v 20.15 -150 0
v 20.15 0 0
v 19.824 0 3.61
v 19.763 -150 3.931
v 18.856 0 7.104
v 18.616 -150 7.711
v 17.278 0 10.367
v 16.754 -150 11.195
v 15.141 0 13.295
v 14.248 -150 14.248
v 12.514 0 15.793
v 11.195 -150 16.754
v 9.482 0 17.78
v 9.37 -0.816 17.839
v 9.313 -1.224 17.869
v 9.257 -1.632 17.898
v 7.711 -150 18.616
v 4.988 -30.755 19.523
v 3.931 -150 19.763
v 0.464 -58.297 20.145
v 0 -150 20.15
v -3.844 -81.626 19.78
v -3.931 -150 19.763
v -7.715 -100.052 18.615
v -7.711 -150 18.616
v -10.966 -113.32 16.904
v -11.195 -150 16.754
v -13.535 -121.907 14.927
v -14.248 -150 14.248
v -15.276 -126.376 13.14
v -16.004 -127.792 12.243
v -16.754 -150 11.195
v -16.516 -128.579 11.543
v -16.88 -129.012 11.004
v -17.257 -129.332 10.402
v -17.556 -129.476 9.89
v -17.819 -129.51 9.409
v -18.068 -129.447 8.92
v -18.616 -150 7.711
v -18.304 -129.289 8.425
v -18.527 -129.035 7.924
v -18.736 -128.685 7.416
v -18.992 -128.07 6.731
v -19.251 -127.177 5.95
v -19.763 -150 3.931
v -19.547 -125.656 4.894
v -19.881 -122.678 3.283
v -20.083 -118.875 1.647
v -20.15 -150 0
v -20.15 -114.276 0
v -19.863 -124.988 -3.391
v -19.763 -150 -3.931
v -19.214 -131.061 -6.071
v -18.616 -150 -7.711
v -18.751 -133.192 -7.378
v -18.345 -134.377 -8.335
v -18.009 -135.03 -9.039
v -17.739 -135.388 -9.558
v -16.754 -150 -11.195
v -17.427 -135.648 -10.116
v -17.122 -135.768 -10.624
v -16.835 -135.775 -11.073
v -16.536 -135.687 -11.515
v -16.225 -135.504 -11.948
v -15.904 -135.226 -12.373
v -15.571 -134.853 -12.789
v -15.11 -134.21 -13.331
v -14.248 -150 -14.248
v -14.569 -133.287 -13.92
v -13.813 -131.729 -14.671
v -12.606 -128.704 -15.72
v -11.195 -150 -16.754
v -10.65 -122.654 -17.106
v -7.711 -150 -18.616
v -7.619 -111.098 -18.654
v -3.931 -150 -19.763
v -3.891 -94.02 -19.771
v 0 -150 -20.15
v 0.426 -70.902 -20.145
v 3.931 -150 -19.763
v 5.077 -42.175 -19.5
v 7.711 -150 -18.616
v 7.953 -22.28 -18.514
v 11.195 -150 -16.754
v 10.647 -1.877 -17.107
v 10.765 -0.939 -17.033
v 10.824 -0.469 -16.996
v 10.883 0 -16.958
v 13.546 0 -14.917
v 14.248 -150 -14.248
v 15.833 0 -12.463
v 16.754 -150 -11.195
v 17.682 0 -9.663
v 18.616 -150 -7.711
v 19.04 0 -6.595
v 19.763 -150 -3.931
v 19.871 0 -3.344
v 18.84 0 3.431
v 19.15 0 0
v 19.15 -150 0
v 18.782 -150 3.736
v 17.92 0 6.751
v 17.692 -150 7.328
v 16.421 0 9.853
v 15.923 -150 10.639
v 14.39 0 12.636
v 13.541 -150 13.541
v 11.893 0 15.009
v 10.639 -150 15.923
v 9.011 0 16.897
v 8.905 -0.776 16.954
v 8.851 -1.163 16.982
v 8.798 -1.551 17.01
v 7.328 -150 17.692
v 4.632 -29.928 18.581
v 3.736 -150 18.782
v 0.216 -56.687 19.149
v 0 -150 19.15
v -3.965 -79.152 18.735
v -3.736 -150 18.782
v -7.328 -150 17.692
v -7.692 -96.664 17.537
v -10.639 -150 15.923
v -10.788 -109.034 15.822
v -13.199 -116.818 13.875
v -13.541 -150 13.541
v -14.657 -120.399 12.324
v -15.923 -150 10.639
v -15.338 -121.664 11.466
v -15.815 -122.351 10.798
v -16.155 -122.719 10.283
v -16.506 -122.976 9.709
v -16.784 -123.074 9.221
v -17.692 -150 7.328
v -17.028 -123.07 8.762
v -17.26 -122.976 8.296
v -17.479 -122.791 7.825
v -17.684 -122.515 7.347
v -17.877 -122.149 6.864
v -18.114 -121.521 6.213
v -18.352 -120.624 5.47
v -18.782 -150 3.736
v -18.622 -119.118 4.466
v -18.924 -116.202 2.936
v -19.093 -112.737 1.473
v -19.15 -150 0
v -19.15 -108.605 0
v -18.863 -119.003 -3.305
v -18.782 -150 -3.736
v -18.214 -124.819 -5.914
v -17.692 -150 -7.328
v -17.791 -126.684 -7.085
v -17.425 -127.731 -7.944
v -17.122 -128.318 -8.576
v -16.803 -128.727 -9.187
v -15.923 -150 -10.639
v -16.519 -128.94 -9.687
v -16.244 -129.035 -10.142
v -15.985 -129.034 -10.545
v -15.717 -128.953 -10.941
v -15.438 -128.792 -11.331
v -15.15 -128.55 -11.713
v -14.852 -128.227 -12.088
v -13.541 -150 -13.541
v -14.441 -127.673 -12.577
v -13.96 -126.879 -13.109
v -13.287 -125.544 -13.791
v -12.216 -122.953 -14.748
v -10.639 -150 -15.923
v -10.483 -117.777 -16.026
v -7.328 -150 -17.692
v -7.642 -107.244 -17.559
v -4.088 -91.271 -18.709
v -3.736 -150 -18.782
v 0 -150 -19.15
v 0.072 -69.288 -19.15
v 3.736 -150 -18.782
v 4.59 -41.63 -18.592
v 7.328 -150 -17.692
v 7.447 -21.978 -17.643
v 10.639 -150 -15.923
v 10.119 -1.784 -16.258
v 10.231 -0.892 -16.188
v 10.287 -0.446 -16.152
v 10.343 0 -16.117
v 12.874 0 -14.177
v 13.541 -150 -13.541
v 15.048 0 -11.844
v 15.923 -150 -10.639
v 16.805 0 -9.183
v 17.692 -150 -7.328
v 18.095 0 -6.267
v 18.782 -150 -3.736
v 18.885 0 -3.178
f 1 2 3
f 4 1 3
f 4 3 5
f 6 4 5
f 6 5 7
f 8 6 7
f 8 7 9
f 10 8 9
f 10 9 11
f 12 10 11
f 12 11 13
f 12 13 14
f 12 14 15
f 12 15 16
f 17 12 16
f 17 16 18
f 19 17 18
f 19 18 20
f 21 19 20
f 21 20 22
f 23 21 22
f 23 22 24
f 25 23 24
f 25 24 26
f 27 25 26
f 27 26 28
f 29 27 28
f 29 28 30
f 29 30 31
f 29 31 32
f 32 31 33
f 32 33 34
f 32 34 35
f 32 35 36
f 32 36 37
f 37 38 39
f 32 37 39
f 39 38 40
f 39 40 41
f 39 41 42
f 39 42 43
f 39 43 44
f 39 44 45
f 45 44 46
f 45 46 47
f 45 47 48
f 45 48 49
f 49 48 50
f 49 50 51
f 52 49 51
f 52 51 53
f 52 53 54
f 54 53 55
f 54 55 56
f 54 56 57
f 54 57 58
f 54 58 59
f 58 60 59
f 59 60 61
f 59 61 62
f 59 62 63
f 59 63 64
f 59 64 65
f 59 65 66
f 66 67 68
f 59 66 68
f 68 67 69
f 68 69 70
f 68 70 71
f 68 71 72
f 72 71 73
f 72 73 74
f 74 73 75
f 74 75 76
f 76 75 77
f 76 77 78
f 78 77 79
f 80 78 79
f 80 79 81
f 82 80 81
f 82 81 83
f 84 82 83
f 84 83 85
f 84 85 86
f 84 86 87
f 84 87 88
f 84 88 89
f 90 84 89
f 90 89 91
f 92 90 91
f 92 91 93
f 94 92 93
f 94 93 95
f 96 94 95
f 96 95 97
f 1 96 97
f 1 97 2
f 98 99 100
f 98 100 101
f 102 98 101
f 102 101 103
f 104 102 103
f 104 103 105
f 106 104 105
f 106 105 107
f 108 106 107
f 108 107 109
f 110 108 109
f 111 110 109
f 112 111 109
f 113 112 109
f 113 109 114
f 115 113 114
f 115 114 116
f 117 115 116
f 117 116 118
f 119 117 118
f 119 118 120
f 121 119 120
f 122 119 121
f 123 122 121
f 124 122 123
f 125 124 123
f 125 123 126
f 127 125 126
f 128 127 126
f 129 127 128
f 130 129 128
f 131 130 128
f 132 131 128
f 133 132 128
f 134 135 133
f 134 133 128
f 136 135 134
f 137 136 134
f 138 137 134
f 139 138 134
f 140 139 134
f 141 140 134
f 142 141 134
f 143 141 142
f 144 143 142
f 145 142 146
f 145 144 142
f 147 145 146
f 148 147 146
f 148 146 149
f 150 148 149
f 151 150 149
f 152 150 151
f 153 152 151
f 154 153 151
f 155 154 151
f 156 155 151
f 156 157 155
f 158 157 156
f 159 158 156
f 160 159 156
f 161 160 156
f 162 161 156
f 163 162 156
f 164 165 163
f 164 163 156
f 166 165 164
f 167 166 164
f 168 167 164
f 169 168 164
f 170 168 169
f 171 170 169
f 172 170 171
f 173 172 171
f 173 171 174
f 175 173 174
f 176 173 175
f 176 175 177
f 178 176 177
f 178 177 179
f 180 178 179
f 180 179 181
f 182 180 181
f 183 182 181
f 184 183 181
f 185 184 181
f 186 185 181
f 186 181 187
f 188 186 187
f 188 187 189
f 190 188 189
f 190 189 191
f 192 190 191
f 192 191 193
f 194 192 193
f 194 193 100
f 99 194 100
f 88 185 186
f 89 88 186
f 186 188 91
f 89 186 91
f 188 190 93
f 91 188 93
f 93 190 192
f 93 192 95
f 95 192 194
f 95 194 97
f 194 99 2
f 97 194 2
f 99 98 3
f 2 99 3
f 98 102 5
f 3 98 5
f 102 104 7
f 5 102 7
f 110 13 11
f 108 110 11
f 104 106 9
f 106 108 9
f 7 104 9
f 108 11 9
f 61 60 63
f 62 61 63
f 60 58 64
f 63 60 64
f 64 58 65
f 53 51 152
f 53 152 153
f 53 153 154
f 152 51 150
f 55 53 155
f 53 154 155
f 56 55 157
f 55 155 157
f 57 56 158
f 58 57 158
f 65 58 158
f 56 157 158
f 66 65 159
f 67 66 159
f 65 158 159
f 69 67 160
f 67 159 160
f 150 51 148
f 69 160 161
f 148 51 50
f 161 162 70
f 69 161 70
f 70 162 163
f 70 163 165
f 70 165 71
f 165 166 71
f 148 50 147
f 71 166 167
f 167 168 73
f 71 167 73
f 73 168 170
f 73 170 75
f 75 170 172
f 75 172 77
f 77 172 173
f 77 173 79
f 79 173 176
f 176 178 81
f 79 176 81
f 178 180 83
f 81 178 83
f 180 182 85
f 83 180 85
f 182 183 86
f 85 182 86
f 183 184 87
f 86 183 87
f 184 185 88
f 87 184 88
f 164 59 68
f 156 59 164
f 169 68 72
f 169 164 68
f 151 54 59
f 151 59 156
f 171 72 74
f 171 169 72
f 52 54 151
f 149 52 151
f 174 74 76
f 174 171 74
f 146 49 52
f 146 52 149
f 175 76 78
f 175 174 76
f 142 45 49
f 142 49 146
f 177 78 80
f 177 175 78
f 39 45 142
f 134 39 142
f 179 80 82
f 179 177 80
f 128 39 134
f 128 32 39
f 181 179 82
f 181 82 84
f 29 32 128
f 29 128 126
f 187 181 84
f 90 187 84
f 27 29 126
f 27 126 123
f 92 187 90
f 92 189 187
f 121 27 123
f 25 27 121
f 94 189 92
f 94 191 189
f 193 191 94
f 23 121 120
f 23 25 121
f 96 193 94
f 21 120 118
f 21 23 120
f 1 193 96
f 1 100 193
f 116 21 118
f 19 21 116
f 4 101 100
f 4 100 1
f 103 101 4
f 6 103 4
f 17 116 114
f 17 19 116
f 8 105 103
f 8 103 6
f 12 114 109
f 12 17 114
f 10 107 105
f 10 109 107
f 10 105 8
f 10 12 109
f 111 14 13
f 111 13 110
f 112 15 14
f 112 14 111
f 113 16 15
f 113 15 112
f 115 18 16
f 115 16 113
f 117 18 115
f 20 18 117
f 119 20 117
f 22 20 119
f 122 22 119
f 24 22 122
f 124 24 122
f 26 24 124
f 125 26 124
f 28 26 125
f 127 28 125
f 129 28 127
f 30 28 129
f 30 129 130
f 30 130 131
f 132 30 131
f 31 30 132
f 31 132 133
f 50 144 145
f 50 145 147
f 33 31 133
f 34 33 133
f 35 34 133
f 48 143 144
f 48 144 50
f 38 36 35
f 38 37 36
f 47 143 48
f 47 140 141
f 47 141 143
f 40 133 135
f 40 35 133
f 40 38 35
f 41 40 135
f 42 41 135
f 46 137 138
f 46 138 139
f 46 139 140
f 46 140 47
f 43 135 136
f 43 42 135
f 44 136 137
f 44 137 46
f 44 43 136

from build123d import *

# Parameters (mm, degrees)
F0_R     = 20.15
F0_R_2   = 19.15
F1_DEPTH = 150
F4_DEPTH = 151.221174
F5_DEPTH = 3.500011


with BuildPart() as f1:
    # F0 (on Front) → F1 (new body)
    with BuildSketch(Plane.XZ):
        Circle(F0_R)
        Circle(F0_R_2, mode=Mode.SUBTRACT)
    extrude(amount=F1_DEPTH)

    # F3 (on face) → F4 (cut, through all)
    with BuildSketch(Plane(origin=(0, 0, 0), x_dir=(-0.984808, 0.173648, 0), z_dir=(0.173648, 0.984808, 0))):
        with BuildLine():
            Line((0, 0), (-16.027075, -25.360064))
            ThreePointArc((-16.027075, -25.360064), (29.975998, -1.199822), (-13.948922, 26.559887))
            Line((-13.948922, 26.559887), (0, 0))
        make_face()
    extrude(amount=-F4_DEPTH, mode=Mode.SUBTRACT)

    # F3 (on face) → F5 (cut, through all)
    with BuildSketch(Plane(origin=(0, 0, 0), x_dir=(-0.984808, 0.173648, 0), z_dir=(0.173648, 0.984808, 0))):
        with BuildLine():
            Line((0, 0), (-16.027075, -25.360064))
            ThreePointArc((-16.027075, -25.360064), (29.975998, -1.199822), (-13.948922, 26.559887))
            Line((-13.948922, 26.559887), (0, 0))
        make_face()
    extrude(amount=F5_DEPTH, mode=Mode.SUBTRACT)


solid = f1.part
